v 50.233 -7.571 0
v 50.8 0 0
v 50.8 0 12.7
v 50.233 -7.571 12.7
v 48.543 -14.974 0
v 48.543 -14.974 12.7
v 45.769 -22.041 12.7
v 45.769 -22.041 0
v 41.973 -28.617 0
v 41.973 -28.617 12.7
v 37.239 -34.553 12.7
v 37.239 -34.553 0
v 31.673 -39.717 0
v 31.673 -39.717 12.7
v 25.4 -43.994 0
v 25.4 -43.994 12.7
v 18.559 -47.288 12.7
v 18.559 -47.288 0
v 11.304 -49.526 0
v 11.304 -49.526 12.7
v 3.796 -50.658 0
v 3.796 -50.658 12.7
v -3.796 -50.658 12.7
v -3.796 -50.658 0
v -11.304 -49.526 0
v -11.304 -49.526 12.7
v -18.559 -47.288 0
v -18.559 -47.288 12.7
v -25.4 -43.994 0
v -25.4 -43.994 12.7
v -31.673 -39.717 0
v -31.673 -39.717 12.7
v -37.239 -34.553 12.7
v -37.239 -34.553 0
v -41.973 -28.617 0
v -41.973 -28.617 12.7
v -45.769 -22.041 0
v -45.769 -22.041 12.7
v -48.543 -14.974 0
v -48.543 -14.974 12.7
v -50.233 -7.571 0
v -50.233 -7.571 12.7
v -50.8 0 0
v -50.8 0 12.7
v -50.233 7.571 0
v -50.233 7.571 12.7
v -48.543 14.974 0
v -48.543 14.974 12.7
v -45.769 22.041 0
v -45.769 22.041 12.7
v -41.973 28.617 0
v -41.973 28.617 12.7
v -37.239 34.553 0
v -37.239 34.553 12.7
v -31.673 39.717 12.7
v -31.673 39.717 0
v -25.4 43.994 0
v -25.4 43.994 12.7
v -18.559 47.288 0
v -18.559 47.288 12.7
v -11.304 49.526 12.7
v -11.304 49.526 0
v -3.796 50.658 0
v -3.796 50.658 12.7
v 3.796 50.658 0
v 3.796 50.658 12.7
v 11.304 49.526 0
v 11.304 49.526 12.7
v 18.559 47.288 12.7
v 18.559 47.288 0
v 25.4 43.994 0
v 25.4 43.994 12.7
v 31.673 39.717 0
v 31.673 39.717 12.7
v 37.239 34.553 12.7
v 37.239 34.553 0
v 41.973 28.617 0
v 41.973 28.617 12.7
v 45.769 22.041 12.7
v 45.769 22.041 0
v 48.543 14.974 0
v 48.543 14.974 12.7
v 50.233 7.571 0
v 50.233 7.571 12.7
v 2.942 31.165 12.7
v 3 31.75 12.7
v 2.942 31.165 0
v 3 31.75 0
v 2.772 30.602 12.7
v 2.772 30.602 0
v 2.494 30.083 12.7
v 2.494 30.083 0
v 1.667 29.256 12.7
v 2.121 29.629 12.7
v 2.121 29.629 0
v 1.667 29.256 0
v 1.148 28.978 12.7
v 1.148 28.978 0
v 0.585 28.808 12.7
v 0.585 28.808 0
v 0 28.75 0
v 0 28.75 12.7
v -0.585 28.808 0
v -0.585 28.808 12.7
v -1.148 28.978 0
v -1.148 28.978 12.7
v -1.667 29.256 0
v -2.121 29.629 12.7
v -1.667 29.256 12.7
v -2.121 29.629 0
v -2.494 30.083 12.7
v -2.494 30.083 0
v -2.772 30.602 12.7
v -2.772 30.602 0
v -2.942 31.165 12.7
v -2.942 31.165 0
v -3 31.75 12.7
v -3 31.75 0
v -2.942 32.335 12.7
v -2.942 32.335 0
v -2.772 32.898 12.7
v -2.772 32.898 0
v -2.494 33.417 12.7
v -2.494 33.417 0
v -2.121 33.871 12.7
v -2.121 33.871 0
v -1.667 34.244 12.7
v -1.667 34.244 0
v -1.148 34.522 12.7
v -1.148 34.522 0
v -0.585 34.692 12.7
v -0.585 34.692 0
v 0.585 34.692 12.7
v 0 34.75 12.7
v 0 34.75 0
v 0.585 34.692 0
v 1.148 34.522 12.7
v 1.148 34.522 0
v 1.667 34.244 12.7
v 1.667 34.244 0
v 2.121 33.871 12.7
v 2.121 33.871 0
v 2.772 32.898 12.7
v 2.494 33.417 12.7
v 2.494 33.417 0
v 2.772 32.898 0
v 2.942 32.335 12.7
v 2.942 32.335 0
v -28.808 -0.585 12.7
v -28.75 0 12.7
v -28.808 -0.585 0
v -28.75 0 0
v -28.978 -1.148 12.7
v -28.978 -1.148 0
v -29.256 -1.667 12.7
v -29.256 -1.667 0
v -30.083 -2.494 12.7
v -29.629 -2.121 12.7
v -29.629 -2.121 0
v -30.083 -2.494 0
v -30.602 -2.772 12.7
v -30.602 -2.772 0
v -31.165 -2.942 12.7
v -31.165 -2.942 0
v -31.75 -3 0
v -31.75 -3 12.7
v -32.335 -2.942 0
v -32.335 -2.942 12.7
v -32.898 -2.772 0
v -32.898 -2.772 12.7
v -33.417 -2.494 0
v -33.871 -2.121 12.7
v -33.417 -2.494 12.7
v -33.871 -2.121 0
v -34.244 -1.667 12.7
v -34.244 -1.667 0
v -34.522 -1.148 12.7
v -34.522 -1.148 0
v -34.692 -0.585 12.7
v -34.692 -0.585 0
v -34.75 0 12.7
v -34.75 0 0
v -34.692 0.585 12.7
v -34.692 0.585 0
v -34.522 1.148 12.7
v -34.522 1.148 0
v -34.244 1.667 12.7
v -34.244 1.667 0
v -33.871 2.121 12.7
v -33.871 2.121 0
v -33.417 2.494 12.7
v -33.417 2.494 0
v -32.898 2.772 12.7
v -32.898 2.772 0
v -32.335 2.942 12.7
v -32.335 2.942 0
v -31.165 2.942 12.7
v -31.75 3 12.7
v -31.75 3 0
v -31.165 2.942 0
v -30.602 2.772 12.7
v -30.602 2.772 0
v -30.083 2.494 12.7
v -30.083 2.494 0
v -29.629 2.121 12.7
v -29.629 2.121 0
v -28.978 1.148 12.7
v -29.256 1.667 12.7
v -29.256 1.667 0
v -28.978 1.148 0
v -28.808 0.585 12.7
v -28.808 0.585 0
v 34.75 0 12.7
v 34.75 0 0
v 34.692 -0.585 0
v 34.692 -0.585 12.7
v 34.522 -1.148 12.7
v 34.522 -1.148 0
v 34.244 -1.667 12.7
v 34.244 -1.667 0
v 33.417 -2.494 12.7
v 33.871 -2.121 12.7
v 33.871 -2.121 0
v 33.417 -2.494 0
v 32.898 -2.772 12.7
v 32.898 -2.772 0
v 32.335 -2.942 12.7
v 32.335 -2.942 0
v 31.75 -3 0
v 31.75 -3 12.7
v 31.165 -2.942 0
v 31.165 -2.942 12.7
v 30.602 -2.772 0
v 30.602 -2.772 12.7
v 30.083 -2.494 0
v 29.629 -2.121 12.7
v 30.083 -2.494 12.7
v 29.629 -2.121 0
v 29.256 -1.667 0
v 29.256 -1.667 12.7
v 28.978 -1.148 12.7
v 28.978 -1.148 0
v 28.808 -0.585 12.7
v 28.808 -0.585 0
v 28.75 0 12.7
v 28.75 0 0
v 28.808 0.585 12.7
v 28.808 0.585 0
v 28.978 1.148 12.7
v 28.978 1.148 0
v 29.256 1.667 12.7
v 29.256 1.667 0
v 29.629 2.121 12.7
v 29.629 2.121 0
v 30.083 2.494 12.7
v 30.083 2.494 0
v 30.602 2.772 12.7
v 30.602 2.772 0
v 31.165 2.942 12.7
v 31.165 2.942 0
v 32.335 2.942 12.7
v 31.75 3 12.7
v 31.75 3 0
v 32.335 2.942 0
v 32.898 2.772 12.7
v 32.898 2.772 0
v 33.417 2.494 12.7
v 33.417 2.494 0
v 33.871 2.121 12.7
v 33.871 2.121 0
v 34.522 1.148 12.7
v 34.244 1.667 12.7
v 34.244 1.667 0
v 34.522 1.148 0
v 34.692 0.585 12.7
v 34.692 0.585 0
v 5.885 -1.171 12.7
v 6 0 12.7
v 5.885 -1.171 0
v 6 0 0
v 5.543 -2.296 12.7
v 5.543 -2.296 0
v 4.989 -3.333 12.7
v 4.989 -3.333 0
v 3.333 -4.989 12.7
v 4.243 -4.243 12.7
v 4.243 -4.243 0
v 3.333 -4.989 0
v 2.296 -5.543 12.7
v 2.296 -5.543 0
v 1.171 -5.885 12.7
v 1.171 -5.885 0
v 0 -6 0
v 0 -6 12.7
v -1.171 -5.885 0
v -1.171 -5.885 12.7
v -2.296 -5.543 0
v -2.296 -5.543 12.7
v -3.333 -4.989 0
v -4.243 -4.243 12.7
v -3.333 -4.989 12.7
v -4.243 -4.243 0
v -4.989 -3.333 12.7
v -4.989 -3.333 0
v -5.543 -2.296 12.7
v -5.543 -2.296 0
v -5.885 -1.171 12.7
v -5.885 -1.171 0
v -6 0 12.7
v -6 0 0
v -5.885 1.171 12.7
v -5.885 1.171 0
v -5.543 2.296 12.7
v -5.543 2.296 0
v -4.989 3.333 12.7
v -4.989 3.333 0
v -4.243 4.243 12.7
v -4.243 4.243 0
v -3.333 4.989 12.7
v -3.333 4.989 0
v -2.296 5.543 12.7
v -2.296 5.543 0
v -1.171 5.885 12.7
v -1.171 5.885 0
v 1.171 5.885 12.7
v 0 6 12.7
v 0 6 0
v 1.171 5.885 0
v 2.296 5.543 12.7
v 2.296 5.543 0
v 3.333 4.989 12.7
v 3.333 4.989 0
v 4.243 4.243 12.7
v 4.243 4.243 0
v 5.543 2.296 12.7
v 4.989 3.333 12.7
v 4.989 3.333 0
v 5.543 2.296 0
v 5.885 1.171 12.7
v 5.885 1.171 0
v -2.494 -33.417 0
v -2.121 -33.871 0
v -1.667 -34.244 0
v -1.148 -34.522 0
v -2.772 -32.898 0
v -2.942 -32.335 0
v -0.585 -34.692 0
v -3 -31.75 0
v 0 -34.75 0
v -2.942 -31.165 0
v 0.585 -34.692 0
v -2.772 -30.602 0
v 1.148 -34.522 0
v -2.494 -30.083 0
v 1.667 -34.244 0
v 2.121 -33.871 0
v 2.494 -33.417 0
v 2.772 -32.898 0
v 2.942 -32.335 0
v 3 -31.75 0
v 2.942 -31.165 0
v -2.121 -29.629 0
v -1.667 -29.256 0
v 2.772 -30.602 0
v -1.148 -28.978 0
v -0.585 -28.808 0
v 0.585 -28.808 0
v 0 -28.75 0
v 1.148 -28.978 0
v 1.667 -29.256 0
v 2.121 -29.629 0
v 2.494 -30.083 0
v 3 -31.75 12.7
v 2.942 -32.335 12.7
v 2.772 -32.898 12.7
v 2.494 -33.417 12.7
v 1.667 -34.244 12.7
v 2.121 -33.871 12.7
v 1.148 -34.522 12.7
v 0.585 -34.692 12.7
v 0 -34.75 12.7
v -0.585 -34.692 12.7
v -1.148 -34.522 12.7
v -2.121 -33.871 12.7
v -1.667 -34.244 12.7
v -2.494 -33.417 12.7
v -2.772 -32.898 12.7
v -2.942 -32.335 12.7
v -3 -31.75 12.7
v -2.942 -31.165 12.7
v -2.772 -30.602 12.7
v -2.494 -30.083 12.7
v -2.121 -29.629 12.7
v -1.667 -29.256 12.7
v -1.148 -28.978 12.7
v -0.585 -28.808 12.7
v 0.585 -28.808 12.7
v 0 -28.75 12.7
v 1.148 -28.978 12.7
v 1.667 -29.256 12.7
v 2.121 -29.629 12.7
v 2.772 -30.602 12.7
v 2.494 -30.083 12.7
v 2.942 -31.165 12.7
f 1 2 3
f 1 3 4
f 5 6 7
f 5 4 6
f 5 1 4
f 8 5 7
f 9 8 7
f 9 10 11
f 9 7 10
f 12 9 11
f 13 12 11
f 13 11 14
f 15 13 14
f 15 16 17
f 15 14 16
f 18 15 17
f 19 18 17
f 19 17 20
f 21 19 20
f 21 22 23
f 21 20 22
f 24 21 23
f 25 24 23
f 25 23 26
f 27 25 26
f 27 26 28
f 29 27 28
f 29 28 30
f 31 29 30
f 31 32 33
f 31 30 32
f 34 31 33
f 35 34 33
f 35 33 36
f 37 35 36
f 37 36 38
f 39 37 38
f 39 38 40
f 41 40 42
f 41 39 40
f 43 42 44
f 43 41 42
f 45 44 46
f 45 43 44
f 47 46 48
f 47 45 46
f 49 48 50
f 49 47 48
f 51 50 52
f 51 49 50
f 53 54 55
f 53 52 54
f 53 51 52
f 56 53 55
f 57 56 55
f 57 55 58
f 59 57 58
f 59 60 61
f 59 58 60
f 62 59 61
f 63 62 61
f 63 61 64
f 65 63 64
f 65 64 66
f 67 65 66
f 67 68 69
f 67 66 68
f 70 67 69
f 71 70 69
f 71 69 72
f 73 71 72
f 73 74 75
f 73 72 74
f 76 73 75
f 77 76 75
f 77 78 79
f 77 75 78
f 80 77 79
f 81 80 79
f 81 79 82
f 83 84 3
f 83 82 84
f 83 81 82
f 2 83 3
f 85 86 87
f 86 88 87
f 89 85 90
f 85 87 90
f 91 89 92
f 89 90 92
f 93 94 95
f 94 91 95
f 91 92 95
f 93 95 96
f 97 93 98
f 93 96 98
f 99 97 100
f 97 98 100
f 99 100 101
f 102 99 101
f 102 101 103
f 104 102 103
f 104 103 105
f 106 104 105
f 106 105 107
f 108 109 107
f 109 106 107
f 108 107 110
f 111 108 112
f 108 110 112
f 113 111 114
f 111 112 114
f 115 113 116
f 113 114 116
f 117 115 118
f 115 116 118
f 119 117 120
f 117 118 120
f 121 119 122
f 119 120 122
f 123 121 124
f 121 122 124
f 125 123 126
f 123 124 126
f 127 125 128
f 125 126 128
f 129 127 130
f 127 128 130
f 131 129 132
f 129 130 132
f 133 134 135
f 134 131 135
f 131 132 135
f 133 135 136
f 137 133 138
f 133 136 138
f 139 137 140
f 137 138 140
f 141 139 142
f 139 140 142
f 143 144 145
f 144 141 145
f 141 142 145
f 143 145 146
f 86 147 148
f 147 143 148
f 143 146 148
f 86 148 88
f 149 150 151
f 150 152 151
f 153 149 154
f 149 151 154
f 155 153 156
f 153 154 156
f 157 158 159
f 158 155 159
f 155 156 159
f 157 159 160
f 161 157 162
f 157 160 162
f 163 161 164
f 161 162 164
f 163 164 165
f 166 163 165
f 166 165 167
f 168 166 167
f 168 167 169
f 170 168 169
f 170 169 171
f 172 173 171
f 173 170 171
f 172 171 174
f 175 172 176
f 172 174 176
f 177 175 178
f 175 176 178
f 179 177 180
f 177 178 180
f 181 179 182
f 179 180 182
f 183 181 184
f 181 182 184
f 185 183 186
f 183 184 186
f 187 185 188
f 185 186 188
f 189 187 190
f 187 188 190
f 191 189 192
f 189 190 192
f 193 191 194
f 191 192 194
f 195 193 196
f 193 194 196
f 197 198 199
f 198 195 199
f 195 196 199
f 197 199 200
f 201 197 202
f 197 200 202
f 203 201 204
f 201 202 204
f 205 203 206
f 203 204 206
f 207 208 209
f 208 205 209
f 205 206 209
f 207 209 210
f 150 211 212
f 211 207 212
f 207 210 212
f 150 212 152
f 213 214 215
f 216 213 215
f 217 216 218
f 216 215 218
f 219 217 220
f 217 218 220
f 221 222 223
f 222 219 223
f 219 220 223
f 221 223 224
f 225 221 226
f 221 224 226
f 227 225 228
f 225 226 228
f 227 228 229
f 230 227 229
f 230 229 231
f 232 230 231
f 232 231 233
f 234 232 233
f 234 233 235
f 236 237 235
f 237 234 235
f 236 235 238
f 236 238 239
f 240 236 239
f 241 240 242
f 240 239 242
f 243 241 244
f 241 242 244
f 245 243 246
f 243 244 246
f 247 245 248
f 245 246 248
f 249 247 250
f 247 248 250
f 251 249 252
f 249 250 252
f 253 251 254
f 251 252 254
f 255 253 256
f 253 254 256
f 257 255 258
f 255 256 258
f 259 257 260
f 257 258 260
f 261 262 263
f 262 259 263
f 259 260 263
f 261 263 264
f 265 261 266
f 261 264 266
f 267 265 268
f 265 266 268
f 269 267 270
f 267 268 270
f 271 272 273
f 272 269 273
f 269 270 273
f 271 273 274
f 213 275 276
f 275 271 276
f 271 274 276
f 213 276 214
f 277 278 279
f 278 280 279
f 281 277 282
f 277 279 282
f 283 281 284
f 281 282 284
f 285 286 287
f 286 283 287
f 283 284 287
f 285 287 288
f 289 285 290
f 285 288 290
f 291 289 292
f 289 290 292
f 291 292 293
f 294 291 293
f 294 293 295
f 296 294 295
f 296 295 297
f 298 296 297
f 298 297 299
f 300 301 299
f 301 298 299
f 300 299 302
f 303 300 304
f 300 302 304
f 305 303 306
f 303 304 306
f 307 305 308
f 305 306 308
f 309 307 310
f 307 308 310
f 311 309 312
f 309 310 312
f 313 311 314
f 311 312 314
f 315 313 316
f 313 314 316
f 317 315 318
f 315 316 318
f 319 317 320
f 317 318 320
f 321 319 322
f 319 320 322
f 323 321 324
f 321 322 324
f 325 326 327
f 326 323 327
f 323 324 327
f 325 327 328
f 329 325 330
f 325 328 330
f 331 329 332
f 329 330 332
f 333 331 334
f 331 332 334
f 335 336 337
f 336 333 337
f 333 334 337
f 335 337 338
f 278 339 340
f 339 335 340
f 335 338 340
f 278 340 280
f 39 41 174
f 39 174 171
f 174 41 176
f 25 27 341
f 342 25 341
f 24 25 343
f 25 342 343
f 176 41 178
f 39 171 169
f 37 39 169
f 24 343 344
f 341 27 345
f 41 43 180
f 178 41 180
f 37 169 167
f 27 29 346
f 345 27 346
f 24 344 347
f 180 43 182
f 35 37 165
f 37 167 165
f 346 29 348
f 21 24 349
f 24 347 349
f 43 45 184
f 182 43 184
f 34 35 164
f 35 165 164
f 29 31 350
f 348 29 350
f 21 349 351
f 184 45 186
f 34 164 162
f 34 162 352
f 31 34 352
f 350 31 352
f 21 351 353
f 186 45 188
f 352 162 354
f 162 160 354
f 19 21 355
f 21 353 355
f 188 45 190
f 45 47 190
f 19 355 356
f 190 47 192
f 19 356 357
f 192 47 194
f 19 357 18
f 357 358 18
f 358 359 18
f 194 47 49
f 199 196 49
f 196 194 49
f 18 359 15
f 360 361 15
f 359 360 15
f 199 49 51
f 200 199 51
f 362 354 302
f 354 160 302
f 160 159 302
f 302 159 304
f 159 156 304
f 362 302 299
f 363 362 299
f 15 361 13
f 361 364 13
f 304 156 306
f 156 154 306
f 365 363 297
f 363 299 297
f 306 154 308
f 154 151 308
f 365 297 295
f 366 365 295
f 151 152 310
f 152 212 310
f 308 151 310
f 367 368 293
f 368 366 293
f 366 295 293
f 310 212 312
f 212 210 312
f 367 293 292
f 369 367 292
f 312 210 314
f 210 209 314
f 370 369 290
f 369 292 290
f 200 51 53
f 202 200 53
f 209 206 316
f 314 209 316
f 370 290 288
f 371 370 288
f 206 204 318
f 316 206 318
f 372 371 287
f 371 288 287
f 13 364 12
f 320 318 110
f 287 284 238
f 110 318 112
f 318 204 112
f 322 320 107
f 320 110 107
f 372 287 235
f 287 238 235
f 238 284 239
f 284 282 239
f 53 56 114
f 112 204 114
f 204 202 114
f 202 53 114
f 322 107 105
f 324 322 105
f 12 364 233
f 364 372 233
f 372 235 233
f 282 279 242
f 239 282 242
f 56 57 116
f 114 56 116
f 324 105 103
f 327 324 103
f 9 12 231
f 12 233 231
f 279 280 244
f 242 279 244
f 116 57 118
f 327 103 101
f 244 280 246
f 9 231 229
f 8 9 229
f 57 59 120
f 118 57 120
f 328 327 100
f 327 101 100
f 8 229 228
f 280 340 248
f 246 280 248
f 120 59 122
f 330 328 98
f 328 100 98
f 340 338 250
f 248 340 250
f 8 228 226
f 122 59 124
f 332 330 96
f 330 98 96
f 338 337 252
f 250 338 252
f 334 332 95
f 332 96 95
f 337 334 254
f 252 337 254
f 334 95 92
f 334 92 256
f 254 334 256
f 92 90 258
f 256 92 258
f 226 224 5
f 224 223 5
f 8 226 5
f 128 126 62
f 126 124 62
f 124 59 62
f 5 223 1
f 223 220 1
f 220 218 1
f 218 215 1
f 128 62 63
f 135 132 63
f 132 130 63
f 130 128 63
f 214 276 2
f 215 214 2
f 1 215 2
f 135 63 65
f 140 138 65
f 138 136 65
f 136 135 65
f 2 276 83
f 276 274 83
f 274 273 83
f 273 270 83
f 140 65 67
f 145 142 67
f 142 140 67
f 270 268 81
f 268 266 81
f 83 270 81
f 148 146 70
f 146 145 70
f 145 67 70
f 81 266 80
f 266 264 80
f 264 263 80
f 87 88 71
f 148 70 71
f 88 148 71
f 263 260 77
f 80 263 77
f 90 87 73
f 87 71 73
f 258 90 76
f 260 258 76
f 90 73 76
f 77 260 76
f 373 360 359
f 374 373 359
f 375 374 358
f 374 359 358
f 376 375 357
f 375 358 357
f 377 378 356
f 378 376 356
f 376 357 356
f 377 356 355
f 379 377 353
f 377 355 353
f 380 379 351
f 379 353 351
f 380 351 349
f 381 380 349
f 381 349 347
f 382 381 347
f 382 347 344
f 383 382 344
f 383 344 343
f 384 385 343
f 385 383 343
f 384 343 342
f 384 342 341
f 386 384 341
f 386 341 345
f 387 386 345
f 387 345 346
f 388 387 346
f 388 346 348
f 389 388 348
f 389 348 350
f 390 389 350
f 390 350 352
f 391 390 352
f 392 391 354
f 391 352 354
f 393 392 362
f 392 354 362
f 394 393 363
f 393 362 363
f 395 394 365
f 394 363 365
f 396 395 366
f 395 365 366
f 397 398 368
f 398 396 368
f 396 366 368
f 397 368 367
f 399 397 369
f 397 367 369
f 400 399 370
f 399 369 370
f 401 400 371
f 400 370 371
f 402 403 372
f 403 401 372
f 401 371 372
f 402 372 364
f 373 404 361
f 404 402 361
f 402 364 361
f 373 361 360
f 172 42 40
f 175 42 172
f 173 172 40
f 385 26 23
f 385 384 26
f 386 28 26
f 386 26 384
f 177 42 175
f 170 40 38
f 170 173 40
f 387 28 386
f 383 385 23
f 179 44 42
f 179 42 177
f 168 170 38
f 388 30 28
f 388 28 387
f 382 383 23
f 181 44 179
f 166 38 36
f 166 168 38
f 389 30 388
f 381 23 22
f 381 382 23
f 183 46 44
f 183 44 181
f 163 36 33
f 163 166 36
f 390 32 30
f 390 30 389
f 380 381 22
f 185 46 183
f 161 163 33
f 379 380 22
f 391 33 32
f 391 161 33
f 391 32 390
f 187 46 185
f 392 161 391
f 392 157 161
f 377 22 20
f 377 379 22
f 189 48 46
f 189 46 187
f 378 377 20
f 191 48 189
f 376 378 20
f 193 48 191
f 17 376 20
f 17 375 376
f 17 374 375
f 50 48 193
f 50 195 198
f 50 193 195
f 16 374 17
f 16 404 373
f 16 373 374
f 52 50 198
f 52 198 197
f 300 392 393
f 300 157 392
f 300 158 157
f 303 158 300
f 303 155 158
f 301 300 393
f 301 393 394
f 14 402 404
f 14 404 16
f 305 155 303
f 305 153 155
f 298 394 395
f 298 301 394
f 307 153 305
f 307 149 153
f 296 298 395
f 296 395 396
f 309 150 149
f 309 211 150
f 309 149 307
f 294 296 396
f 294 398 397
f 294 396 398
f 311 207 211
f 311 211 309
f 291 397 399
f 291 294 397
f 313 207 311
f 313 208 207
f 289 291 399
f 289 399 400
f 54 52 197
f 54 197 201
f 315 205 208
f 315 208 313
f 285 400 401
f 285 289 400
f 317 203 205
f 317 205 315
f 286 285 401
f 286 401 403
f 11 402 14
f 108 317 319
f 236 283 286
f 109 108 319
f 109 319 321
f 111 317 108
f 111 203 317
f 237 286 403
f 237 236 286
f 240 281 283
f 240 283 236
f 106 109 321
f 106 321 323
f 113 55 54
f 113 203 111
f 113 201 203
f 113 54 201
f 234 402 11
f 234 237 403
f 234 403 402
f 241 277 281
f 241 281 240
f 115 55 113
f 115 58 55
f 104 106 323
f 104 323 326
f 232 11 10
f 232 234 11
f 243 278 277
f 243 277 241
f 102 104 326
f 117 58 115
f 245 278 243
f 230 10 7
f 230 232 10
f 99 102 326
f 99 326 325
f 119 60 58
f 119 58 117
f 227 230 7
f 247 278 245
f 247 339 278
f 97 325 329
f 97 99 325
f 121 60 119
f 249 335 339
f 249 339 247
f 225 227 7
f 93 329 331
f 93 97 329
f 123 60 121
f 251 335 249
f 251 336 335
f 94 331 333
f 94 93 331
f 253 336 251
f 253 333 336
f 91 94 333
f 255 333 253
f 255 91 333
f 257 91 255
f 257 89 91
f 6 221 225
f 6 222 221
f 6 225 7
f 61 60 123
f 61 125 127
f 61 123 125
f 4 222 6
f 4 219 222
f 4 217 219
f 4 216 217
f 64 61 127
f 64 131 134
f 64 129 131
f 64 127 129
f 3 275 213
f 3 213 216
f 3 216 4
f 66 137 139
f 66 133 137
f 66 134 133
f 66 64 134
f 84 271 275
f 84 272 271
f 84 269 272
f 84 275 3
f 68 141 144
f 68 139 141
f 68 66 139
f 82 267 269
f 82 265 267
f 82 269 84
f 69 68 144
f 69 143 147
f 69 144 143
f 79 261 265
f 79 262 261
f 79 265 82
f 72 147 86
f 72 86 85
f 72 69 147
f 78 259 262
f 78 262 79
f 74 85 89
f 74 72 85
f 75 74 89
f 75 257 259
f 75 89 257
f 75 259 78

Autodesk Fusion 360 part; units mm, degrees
sketch "Sketch1" plane through (0, 0, 0) normal (0, 0, 1) x (1, 0, 0)
  circle A0 centre (0, 0) radius 50.8
  line L0 (0, 0) -> (0, 31.75) construction
  circle A1 centre (0, 31.75) radius 3
  circle A2 centre (-31.75, 0) radius 3
  circle A3 centre (0, -31.75) radius 3
  circle A4 centre (31.75, 0) radius 3
  circle A5 centre (0, 0) radius 6
  dimension "d1" = 101.6
  dimension "d2" = 31.75
  dimension "d3" = 6
  dimension "d5" = 360
  dimension "d6" = 12
extrude "Extrude1" add sketch "Sketch1" along normal blind 12.7
sketch "Sketch2" plane through (0, 0, 12.7) normal (0, 0, 1) x (-1, 0, 0)
  circle A0 centre (0, -31.75) radius 3
  circle A1 centre (31.75, 0) radius 3
  circle A2 centre (0, 31.75) radius 3
  circle A3 centre (-31.75, 0) radius 3
  circle A4 centre (0, 0) radius 6
  circle A5 centre (0, 0) radius 50.8
equation "d2 = 2.5 in / 2"
